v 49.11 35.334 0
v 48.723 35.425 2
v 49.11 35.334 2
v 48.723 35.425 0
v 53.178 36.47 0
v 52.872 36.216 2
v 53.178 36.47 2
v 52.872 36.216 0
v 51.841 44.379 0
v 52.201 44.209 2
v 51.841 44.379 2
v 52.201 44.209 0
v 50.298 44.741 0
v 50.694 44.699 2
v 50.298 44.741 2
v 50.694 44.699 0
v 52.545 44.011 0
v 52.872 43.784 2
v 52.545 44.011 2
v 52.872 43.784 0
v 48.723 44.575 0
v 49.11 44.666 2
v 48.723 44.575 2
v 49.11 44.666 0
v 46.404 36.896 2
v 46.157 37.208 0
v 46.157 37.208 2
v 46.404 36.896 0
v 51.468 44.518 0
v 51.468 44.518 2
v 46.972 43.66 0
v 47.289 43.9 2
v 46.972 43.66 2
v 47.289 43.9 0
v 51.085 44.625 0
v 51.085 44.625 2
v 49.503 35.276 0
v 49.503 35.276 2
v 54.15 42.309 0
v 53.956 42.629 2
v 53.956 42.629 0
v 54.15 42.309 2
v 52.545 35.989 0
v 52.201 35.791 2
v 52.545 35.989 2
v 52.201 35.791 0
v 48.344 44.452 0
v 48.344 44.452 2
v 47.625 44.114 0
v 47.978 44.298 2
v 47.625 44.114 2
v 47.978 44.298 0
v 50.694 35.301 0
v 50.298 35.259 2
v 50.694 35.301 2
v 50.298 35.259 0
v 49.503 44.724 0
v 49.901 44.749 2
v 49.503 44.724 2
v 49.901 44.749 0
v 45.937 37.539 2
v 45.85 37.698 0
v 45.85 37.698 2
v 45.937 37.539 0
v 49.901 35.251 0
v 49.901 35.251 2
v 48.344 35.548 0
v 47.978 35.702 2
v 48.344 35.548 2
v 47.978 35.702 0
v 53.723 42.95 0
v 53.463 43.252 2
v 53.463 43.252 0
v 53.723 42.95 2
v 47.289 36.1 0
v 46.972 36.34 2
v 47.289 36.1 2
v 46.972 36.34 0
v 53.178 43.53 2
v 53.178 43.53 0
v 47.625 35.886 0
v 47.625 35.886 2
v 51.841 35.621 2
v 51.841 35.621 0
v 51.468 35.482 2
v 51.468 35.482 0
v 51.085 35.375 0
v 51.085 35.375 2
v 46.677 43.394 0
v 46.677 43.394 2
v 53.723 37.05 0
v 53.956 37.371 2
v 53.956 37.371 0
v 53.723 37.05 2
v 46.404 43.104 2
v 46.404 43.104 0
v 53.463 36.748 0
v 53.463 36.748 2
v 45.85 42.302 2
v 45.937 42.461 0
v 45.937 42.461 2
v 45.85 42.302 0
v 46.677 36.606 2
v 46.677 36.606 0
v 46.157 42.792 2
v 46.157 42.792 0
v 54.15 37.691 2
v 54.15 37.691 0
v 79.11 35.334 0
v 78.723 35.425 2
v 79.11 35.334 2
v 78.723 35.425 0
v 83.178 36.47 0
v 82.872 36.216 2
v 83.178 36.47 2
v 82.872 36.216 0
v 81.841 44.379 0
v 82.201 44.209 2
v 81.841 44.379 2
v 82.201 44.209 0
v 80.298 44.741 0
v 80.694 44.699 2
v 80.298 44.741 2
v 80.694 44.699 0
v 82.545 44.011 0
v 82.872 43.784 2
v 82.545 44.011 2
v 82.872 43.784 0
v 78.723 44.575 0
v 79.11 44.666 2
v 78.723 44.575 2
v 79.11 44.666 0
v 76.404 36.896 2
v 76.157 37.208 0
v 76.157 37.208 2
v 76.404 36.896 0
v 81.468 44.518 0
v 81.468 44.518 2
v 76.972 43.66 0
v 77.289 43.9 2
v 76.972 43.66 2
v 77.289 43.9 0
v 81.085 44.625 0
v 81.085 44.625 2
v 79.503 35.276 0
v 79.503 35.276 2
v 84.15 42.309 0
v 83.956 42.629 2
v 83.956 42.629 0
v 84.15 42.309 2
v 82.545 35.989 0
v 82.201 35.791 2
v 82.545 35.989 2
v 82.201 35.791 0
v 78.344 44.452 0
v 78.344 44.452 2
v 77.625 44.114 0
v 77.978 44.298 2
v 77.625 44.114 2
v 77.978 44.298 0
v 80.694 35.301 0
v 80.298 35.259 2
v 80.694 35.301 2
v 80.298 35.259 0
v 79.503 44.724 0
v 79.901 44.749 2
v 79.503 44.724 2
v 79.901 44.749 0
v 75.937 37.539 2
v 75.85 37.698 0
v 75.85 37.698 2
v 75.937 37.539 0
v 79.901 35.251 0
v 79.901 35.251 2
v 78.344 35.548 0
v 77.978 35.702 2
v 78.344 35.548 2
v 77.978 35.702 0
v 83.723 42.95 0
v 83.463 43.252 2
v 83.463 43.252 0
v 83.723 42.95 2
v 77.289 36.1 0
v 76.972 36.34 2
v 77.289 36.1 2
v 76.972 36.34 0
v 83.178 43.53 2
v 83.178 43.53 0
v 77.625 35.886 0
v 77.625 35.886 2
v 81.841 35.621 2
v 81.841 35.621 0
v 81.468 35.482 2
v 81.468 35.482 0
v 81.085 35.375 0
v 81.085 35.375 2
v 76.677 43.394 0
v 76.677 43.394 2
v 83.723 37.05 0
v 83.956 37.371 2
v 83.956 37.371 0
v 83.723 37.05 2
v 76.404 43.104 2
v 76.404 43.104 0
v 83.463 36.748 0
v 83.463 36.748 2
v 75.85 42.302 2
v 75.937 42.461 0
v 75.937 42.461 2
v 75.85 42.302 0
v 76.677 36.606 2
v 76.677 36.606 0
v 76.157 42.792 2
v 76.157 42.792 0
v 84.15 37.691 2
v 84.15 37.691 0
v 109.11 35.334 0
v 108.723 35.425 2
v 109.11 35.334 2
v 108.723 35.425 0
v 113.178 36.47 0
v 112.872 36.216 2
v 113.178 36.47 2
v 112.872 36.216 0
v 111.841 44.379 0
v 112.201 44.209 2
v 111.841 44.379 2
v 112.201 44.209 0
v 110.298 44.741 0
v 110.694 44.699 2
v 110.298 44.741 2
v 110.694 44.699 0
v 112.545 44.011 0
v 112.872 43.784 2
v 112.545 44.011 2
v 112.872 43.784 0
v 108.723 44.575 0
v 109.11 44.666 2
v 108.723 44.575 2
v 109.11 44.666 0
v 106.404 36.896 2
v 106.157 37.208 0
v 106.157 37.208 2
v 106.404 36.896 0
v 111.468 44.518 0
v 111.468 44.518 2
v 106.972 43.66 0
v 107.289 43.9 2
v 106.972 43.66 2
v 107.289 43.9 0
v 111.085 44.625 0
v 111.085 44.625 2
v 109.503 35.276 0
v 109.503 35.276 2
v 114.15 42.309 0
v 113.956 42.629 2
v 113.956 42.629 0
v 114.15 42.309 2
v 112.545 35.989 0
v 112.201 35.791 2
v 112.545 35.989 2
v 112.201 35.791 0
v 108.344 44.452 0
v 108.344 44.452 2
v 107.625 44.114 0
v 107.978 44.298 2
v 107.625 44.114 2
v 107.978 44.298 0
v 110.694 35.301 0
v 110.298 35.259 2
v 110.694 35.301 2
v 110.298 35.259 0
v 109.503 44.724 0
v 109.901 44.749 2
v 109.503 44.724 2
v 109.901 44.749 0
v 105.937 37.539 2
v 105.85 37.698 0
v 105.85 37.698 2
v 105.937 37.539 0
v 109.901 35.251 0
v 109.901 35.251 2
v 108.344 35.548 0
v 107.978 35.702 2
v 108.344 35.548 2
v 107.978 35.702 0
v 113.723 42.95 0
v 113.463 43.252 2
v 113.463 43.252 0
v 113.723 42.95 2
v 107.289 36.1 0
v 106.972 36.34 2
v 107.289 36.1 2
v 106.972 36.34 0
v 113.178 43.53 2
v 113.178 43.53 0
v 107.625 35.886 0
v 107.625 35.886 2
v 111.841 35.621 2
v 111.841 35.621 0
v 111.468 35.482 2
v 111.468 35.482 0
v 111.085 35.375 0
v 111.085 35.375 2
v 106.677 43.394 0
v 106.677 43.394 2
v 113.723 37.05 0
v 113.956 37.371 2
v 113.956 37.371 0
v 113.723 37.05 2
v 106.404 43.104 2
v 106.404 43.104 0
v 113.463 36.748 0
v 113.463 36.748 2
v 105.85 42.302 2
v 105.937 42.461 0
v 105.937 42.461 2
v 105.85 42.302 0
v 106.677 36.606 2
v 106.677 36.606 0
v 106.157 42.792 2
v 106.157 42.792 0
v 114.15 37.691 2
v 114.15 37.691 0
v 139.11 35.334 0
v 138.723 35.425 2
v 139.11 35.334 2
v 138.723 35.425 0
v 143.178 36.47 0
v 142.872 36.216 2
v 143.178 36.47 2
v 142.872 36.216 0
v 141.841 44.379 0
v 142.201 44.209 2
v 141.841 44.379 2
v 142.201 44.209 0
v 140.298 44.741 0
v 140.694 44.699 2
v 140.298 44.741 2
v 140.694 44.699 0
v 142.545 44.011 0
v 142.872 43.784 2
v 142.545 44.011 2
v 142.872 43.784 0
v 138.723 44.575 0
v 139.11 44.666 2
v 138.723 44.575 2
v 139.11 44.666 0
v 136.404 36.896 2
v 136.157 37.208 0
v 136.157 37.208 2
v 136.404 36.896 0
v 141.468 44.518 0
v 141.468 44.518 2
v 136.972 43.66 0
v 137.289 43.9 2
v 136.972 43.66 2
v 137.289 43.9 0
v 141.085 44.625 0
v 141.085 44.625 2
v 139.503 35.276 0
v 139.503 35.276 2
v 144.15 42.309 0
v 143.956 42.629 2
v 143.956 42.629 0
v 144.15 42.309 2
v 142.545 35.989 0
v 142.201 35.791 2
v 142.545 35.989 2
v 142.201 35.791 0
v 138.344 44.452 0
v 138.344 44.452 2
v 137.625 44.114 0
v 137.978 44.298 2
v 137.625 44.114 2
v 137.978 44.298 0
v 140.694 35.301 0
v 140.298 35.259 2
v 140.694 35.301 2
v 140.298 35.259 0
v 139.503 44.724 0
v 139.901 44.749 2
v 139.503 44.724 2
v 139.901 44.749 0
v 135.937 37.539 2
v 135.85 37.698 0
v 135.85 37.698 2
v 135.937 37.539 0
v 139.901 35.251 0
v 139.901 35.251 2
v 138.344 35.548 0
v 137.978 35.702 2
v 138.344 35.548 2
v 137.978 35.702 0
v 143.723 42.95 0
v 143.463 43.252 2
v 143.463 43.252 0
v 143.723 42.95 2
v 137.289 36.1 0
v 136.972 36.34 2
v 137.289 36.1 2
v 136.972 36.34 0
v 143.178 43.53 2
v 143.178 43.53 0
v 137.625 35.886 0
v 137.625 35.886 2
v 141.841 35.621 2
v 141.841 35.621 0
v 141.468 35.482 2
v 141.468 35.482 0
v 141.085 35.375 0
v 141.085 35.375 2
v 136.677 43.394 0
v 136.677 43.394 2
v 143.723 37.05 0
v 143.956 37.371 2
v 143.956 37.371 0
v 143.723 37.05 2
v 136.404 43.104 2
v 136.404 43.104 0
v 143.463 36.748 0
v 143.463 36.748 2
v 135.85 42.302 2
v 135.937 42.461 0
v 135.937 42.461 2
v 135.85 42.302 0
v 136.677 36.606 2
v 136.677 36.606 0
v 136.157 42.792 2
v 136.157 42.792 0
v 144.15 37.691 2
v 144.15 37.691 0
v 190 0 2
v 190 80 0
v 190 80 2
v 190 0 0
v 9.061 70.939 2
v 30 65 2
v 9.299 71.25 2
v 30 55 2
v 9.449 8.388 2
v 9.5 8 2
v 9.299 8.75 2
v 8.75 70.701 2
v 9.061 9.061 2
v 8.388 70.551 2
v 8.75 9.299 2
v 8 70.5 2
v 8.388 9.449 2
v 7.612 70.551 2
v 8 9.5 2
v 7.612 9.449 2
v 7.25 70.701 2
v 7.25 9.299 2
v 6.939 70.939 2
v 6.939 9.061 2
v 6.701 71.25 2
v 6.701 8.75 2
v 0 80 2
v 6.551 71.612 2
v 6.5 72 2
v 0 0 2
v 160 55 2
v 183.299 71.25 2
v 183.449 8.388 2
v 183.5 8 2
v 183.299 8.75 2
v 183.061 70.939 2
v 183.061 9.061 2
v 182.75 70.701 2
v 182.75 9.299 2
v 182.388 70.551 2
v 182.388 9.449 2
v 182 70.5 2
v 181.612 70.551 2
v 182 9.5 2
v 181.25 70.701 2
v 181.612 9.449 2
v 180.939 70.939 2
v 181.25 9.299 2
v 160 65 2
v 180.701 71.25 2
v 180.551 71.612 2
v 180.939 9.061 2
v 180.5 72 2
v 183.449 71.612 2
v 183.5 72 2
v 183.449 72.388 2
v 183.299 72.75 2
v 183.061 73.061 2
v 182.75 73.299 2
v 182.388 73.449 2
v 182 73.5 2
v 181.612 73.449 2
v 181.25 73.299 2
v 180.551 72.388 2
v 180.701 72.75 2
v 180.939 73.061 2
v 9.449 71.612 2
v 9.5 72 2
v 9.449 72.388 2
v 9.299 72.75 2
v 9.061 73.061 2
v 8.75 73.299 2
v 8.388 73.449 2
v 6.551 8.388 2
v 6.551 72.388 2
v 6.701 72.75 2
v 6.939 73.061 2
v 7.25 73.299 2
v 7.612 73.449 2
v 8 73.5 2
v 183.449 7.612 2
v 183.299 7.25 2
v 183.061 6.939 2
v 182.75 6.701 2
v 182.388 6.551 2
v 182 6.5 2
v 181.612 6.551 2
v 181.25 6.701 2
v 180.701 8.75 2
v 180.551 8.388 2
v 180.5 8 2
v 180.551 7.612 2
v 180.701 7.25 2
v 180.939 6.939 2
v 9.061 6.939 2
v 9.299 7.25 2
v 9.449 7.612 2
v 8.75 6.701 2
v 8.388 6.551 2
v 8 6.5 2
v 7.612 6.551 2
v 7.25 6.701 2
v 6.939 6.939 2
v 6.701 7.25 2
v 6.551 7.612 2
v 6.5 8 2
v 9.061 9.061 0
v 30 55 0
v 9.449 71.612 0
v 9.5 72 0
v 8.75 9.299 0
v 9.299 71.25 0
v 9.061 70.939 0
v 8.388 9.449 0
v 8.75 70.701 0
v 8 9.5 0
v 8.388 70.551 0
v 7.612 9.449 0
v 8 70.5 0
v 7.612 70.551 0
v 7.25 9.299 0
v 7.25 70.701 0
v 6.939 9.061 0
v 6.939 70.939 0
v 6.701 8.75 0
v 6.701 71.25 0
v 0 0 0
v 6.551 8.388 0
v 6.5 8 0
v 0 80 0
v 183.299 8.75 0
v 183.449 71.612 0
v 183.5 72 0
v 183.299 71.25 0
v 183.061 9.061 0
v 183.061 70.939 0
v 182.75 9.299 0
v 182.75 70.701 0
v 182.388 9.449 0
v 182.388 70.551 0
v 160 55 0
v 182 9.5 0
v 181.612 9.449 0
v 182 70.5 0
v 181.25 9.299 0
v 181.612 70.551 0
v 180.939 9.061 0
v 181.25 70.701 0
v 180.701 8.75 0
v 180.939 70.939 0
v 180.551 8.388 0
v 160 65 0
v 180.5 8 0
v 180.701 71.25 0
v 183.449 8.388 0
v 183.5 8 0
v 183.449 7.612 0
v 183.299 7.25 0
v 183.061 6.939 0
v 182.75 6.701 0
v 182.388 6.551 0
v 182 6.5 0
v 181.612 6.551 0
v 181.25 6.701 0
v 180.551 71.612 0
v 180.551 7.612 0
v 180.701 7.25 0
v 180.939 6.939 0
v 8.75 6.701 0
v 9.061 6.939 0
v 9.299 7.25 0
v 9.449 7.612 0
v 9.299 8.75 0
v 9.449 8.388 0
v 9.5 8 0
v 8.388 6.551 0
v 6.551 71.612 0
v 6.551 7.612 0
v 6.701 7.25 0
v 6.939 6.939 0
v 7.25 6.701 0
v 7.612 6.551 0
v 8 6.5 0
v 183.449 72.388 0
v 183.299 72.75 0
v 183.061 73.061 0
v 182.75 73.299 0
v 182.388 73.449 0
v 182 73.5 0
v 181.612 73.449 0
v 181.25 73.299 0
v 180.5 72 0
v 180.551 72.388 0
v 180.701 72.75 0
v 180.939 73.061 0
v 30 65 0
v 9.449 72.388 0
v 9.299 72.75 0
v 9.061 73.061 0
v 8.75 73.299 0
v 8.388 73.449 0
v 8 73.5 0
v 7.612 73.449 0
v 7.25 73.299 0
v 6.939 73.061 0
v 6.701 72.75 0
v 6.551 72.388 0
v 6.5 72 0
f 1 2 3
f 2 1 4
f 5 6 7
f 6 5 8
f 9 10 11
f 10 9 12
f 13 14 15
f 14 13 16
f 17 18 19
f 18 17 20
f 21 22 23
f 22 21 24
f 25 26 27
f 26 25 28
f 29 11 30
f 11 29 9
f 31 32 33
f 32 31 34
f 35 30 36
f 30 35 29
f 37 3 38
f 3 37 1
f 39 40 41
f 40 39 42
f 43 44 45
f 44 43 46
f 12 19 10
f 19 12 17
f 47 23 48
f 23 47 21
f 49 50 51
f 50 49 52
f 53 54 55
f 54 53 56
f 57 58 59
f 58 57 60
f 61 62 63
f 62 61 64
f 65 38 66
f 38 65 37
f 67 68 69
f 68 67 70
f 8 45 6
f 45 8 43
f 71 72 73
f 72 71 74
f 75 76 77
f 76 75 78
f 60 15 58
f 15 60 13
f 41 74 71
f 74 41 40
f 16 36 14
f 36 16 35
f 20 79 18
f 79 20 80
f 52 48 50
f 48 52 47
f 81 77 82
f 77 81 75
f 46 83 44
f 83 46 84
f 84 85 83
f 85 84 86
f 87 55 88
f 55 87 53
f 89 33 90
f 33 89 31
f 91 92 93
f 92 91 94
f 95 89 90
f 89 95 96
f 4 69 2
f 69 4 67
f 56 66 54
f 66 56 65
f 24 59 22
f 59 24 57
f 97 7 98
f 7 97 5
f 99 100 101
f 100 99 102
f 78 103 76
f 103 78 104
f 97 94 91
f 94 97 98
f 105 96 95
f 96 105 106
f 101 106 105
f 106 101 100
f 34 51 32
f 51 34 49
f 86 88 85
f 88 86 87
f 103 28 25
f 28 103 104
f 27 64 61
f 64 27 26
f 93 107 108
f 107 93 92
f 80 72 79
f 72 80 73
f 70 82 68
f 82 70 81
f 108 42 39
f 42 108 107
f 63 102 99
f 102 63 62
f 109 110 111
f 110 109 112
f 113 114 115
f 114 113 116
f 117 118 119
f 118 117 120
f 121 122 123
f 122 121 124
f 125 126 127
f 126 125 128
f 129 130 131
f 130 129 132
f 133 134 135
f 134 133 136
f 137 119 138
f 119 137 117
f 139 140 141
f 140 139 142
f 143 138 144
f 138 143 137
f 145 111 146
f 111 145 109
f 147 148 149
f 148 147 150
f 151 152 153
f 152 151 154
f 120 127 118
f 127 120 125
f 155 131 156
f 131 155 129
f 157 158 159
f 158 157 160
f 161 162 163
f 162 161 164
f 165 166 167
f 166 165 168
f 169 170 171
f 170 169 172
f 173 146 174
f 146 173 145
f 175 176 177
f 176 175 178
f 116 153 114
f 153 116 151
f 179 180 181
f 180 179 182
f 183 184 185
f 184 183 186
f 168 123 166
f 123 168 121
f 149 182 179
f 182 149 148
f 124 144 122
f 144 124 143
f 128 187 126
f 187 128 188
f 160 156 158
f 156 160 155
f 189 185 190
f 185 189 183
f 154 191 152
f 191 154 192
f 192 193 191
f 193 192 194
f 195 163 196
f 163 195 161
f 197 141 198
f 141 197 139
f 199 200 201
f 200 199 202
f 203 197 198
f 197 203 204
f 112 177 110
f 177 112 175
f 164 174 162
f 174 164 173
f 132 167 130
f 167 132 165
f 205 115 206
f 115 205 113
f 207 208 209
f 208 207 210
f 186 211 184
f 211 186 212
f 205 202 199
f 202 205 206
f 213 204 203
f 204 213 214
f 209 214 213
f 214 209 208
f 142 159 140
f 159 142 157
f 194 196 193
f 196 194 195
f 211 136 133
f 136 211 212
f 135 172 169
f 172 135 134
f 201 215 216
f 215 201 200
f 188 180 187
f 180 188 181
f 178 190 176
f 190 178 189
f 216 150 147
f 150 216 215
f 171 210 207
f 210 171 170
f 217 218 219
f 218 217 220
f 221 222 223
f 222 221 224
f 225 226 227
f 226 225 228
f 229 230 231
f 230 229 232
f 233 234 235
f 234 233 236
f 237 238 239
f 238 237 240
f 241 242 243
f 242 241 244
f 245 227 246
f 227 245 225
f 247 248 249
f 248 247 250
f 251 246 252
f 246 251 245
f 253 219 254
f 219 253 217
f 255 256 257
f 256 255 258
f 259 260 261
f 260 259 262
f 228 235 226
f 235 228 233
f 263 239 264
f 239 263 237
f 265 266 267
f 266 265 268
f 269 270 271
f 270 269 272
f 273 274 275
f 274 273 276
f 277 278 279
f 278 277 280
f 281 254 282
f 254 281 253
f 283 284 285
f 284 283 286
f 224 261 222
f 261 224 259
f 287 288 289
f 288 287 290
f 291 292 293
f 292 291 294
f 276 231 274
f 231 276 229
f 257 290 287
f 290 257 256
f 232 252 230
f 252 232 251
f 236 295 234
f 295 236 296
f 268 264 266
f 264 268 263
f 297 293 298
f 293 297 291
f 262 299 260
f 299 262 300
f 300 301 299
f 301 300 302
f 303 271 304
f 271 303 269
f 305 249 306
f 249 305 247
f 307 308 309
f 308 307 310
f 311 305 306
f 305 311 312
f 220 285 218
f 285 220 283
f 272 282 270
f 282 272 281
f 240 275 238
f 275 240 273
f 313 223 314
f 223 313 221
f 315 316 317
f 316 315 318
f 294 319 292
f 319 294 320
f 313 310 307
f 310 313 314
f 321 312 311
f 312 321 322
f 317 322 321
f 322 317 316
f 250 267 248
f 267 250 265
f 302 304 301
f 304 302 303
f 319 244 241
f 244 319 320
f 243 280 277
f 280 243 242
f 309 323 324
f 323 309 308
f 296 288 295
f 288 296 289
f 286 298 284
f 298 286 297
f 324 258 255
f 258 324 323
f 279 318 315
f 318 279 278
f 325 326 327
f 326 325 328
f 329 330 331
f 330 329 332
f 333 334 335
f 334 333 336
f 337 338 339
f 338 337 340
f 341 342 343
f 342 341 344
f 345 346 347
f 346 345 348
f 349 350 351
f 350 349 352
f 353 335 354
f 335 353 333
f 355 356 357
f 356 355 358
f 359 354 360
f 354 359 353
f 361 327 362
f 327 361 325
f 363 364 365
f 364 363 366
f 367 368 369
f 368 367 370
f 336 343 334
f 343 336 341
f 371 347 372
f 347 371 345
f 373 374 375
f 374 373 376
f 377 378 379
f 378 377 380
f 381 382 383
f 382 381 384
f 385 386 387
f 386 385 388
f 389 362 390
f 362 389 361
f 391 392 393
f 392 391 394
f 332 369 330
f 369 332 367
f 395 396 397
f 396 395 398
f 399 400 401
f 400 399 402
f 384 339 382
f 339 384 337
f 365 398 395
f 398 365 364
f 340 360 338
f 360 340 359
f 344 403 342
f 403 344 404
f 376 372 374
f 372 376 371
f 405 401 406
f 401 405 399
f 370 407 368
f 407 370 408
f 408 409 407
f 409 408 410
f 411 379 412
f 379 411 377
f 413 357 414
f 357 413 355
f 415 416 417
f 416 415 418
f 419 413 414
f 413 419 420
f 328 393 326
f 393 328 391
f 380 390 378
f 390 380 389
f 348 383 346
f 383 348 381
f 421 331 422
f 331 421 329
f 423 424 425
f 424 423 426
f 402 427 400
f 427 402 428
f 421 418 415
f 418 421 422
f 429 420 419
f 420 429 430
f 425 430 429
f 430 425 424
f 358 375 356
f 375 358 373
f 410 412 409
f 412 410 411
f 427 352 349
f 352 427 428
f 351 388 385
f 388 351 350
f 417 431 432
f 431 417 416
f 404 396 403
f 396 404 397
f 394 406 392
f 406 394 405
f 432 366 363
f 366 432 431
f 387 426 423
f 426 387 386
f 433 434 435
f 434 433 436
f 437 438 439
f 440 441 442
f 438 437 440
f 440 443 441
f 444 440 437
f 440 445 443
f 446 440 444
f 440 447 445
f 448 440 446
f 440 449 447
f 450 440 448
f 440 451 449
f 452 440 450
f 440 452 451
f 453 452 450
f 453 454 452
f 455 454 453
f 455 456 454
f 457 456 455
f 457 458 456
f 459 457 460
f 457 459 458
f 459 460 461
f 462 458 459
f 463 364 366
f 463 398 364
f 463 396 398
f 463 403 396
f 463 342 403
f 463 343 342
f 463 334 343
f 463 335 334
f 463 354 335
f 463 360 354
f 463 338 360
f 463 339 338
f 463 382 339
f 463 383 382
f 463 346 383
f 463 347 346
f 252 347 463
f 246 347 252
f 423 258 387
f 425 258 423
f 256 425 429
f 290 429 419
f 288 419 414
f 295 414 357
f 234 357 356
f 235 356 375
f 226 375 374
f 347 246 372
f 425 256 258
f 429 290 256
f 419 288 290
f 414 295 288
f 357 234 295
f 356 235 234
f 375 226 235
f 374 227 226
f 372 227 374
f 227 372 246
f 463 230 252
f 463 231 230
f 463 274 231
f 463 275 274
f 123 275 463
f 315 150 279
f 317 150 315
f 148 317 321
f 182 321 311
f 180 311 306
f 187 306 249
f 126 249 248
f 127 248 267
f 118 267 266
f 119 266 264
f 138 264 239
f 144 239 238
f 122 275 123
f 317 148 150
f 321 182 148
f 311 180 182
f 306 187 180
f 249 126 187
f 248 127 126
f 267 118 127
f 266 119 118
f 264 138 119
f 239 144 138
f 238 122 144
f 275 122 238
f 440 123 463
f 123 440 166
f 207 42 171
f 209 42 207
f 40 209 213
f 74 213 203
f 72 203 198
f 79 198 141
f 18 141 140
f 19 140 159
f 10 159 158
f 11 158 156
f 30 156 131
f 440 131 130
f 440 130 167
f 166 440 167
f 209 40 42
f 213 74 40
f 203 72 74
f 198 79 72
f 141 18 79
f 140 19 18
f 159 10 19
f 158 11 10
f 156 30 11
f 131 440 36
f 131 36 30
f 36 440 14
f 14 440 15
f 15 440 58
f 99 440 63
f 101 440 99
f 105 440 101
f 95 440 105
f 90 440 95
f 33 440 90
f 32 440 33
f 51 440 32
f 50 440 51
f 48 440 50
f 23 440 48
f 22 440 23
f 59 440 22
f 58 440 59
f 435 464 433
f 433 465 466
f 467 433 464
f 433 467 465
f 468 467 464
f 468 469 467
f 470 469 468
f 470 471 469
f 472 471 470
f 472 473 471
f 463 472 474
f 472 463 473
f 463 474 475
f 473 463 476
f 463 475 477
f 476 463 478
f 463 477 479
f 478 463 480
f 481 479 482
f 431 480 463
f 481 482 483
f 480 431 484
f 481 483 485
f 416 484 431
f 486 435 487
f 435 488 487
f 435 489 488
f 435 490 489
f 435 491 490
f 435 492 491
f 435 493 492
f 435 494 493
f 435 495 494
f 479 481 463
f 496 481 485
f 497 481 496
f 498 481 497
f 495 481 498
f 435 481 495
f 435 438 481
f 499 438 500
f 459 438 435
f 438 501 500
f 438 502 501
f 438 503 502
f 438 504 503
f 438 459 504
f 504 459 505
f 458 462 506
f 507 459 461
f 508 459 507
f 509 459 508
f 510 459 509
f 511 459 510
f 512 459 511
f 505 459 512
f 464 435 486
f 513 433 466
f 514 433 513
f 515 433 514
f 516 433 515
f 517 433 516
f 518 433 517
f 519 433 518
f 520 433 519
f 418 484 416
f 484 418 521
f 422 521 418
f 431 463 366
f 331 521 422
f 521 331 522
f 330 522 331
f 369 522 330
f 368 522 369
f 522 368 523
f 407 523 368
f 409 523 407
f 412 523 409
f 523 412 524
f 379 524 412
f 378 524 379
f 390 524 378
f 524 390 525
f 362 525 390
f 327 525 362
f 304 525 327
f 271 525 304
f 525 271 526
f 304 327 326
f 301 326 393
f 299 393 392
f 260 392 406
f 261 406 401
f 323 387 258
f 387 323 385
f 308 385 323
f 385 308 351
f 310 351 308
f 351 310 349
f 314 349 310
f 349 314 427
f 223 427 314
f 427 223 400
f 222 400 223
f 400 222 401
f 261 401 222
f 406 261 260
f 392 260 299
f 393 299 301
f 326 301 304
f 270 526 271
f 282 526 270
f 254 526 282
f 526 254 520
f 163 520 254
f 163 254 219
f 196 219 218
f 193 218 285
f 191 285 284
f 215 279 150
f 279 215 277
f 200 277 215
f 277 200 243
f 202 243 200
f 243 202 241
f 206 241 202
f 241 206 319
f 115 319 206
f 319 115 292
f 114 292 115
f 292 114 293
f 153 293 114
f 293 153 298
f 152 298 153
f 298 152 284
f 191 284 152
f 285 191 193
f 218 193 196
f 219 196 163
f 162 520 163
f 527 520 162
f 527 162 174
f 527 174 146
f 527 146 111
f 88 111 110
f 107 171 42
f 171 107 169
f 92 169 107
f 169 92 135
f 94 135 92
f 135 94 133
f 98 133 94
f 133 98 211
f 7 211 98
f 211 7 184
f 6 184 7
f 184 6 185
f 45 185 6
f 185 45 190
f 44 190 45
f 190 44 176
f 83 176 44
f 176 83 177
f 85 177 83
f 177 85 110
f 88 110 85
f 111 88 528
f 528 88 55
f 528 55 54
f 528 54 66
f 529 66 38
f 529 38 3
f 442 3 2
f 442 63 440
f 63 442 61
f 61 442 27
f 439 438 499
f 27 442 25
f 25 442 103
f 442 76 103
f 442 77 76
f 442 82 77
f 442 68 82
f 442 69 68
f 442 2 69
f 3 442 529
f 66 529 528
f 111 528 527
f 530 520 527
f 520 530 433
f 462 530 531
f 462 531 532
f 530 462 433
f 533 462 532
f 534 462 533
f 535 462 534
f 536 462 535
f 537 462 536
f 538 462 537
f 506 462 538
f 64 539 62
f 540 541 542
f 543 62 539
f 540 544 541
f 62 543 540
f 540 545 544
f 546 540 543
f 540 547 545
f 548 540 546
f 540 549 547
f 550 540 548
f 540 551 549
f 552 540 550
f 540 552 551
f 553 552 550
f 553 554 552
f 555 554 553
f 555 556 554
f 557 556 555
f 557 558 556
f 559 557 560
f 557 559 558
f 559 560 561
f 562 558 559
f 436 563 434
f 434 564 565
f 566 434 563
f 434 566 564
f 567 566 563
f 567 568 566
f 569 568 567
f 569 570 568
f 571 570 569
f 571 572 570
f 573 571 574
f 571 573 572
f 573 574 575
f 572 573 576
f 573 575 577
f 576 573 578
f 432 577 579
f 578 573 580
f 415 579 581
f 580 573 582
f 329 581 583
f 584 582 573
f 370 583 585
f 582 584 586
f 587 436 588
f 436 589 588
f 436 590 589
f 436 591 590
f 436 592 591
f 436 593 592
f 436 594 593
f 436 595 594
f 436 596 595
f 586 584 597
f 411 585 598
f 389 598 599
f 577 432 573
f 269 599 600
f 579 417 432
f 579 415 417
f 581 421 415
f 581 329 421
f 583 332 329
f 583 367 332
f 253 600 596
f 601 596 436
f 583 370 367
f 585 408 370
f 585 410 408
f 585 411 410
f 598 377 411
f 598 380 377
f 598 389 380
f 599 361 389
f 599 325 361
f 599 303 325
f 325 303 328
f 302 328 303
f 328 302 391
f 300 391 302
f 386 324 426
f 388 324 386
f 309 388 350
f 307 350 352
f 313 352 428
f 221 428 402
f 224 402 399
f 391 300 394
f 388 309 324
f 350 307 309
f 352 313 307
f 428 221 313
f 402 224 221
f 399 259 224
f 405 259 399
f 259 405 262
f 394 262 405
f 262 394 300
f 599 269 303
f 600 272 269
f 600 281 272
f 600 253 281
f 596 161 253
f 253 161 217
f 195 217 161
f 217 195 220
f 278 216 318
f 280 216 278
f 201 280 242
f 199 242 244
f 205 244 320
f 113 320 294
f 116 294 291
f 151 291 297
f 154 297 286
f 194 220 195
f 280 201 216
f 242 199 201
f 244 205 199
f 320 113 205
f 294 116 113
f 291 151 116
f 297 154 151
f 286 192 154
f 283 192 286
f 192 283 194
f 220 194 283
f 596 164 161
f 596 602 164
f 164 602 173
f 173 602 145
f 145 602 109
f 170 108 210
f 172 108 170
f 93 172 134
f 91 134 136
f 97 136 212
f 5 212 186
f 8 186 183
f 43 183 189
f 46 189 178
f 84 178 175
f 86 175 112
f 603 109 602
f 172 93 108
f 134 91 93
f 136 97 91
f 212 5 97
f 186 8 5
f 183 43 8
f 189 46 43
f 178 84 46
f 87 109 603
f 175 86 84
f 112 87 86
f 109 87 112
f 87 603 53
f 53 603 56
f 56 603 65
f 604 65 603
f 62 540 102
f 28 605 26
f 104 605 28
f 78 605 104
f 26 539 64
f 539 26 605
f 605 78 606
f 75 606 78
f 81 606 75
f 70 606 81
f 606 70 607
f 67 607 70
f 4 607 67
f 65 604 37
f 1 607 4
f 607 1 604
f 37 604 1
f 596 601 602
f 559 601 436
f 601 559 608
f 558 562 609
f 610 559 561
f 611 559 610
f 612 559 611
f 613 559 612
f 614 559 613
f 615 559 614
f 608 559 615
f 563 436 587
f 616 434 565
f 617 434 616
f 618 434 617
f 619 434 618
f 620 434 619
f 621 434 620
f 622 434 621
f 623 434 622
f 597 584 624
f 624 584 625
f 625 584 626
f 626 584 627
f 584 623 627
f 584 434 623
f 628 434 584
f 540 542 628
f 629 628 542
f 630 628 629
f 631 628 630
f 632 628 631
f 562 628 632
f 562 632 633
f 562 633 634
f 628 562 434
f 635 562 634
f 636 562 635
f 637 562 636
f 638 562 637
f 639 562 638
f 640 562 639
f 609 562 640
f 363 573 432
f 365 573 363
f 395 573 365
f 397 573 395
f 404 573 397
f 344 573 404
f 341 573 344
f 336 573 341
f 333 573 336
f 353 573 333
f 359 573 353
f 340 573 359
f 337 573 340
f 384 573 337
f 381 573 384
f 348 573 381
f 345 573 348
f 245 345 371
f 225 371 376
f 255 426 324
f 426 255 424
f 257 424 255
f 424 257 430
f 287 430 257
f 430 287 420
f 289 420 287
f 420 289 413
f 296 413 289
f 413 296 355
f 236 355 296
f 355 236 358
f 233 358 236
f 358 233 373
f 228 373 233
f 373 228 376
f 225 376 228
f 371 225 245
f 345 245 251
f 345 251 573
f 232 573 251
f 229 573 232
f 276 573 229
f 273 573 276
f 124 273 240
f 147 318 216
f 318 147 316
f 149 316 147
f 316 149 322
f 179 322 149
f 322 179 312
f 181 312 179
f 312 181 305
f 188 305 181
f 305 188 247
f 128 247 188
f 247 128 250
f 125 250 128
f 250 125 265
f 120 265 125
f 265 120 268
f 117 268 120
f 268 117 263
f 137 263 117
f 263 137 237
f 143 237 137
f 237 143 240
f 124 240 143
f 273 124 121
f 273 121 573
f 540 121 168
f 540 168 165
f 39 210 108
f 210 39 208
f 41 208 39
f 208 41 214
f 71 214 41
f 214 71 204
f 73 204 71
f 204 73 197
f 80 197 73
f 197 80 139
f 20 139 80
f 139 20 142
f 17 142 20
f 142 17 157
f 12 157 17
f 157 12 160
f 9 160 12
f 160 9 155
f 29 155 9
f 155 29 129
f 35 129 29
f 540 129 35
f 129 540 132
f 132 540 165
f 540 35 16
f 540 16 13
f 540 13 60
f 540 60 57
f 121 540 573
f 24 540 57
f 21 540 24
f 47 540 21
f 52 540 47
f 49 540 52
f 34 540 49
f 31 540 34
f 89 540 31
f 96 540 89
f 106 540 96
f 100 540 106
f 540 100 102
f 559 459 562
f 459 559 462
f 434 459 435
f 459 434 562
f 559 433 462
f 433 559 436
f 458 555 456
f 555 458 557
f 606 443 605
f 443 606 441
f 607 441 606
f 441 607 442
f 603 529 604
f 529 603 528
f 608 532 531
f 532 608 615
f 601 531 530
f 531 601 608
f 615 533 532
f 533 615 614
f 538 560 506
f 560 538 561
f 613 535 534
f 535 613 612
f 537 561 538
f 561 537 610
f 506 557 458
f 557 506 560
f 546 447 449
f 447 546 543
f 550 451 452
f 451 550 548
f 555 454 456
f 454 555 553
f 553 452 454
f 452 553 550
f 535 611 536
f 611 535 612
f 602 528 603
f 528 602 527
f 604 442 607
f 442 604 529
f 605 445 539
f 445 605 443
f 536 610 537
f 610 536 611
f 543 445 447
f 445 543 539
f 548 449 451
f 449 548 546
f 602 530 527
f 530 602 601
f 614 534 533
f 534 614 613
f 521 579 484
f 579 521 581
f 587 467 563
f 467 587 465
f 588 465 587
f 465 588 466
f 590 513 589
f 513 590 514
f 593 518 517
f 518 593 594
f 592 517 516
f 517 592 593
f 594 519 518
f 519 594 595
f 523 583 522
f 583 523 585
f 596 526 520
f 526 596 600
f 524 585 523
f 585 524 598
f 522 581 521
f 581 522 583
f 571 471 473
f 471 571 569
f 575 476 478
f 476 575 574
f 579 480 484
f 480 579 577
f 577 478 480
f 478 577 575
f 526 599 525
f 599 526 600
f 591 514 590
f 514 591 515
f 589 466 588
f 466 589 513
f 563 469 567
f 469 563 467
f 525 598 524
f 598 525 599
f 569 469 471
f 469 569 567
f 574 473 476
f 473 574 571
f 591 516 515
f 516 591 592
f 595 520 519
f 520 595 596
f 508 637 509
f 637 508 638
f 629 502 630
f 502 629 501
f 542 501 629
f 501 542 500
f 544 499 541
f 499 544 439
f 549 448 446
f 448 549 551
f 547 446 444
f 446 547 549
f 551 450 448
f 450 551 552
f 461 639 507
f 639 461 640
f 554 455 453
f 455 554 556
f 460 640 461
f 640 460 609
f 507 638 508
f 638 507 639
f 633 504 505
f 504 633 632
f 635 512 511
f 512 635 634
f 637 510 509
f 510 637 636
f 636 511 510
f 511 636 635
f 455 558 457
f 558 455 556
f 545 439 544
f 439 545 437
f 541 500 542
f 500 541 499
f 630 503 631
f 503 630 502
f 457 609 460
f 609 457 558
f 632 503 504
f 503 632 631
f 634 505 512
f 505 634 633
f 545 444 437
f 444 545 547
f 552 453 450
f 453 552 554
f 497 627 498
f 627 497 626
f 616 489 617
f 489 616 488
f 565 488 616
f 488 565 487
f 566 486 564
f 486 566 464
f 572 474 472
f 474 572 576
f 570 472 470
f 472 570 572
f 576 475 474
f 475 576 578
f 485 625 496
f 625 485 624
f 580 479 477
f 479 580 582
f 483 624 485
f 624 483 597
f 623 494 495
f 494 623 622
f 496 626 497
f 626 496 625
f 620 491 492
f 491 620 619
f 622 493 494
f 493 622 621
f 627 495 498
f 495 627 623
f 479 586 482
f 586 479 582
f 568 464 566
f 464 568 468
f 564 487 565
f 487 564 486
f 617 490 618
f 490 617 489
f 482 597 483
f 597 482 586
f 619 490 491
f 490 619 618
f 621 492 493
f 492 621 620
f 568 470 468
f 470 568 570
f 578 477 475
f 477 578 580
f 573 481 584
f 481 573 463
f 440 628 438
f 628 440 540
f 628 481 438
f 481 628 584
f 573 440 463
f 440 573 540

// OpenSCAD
$fa = 1;
$fs = 0.4;

err = 0.0001;
esp = 2.0;
R = 1.5;

D = 9.5;

e = (D - 8.3)/2;
L = 190.0;
W = 190.0;
H = 80;
L1 = 12.0;

difference(){
    cube([W, H, esp]);
    
    translate([esp+L1/2, esp+L1/2,-10])
    cylinder(h=20, r=1.5);

    translate([W - esp-L1/2, esp+L1/2,-10])
    cylinder(h=20, r=1.5);

    translate([esp+L1/2, H-esp-L1/2,-10])
    cylinder(h=20, r=1.5);

    translate([W-esp-L1/2, H-esp-L1/2,-10])
    cylinder(h=20, r=1.5);



    translate([50,H/2, -10])
    difference(){
        cylinder(h=20, r=D/2);

        translate([D/2-e, -D/2, -10])
        cube([D,D,40]);

        translate([-1.5*D+e, -D/2, -10])
        cube([D,D,40]);
    }

    translate([80,H/2, -10])
    difference(){
        cylinder(h=20, r=D/2);

        translate([D/2-e, -D/2, -10])
        cube([D,D,40]);

        translate([-1.5*D+e, -D/2, -10])
        cube([D,D,40]);
    }

    translate([110,H/2, -10])
    difference(){
        cylinder(h=20, r=D/2);

        translate([D/2-e, -D/2, -10])
        cube([D,D,40]);

        translate([-1.5*D+e, -D/2, -10])
        cube([D,D,40]);
    }

    translate([140,H/2, -10])
    difference(){
        cylinder(h=20, r=D/2);

        translate([D/2-e, -D/2, -10])
        cube([D,D,40]);

        translate([-1.5*D+e, -D/2, -10])
        cube([D,D,40]);
    }
    
     translate([30, 55,-10])   
    cube([130,10,20]);


}
